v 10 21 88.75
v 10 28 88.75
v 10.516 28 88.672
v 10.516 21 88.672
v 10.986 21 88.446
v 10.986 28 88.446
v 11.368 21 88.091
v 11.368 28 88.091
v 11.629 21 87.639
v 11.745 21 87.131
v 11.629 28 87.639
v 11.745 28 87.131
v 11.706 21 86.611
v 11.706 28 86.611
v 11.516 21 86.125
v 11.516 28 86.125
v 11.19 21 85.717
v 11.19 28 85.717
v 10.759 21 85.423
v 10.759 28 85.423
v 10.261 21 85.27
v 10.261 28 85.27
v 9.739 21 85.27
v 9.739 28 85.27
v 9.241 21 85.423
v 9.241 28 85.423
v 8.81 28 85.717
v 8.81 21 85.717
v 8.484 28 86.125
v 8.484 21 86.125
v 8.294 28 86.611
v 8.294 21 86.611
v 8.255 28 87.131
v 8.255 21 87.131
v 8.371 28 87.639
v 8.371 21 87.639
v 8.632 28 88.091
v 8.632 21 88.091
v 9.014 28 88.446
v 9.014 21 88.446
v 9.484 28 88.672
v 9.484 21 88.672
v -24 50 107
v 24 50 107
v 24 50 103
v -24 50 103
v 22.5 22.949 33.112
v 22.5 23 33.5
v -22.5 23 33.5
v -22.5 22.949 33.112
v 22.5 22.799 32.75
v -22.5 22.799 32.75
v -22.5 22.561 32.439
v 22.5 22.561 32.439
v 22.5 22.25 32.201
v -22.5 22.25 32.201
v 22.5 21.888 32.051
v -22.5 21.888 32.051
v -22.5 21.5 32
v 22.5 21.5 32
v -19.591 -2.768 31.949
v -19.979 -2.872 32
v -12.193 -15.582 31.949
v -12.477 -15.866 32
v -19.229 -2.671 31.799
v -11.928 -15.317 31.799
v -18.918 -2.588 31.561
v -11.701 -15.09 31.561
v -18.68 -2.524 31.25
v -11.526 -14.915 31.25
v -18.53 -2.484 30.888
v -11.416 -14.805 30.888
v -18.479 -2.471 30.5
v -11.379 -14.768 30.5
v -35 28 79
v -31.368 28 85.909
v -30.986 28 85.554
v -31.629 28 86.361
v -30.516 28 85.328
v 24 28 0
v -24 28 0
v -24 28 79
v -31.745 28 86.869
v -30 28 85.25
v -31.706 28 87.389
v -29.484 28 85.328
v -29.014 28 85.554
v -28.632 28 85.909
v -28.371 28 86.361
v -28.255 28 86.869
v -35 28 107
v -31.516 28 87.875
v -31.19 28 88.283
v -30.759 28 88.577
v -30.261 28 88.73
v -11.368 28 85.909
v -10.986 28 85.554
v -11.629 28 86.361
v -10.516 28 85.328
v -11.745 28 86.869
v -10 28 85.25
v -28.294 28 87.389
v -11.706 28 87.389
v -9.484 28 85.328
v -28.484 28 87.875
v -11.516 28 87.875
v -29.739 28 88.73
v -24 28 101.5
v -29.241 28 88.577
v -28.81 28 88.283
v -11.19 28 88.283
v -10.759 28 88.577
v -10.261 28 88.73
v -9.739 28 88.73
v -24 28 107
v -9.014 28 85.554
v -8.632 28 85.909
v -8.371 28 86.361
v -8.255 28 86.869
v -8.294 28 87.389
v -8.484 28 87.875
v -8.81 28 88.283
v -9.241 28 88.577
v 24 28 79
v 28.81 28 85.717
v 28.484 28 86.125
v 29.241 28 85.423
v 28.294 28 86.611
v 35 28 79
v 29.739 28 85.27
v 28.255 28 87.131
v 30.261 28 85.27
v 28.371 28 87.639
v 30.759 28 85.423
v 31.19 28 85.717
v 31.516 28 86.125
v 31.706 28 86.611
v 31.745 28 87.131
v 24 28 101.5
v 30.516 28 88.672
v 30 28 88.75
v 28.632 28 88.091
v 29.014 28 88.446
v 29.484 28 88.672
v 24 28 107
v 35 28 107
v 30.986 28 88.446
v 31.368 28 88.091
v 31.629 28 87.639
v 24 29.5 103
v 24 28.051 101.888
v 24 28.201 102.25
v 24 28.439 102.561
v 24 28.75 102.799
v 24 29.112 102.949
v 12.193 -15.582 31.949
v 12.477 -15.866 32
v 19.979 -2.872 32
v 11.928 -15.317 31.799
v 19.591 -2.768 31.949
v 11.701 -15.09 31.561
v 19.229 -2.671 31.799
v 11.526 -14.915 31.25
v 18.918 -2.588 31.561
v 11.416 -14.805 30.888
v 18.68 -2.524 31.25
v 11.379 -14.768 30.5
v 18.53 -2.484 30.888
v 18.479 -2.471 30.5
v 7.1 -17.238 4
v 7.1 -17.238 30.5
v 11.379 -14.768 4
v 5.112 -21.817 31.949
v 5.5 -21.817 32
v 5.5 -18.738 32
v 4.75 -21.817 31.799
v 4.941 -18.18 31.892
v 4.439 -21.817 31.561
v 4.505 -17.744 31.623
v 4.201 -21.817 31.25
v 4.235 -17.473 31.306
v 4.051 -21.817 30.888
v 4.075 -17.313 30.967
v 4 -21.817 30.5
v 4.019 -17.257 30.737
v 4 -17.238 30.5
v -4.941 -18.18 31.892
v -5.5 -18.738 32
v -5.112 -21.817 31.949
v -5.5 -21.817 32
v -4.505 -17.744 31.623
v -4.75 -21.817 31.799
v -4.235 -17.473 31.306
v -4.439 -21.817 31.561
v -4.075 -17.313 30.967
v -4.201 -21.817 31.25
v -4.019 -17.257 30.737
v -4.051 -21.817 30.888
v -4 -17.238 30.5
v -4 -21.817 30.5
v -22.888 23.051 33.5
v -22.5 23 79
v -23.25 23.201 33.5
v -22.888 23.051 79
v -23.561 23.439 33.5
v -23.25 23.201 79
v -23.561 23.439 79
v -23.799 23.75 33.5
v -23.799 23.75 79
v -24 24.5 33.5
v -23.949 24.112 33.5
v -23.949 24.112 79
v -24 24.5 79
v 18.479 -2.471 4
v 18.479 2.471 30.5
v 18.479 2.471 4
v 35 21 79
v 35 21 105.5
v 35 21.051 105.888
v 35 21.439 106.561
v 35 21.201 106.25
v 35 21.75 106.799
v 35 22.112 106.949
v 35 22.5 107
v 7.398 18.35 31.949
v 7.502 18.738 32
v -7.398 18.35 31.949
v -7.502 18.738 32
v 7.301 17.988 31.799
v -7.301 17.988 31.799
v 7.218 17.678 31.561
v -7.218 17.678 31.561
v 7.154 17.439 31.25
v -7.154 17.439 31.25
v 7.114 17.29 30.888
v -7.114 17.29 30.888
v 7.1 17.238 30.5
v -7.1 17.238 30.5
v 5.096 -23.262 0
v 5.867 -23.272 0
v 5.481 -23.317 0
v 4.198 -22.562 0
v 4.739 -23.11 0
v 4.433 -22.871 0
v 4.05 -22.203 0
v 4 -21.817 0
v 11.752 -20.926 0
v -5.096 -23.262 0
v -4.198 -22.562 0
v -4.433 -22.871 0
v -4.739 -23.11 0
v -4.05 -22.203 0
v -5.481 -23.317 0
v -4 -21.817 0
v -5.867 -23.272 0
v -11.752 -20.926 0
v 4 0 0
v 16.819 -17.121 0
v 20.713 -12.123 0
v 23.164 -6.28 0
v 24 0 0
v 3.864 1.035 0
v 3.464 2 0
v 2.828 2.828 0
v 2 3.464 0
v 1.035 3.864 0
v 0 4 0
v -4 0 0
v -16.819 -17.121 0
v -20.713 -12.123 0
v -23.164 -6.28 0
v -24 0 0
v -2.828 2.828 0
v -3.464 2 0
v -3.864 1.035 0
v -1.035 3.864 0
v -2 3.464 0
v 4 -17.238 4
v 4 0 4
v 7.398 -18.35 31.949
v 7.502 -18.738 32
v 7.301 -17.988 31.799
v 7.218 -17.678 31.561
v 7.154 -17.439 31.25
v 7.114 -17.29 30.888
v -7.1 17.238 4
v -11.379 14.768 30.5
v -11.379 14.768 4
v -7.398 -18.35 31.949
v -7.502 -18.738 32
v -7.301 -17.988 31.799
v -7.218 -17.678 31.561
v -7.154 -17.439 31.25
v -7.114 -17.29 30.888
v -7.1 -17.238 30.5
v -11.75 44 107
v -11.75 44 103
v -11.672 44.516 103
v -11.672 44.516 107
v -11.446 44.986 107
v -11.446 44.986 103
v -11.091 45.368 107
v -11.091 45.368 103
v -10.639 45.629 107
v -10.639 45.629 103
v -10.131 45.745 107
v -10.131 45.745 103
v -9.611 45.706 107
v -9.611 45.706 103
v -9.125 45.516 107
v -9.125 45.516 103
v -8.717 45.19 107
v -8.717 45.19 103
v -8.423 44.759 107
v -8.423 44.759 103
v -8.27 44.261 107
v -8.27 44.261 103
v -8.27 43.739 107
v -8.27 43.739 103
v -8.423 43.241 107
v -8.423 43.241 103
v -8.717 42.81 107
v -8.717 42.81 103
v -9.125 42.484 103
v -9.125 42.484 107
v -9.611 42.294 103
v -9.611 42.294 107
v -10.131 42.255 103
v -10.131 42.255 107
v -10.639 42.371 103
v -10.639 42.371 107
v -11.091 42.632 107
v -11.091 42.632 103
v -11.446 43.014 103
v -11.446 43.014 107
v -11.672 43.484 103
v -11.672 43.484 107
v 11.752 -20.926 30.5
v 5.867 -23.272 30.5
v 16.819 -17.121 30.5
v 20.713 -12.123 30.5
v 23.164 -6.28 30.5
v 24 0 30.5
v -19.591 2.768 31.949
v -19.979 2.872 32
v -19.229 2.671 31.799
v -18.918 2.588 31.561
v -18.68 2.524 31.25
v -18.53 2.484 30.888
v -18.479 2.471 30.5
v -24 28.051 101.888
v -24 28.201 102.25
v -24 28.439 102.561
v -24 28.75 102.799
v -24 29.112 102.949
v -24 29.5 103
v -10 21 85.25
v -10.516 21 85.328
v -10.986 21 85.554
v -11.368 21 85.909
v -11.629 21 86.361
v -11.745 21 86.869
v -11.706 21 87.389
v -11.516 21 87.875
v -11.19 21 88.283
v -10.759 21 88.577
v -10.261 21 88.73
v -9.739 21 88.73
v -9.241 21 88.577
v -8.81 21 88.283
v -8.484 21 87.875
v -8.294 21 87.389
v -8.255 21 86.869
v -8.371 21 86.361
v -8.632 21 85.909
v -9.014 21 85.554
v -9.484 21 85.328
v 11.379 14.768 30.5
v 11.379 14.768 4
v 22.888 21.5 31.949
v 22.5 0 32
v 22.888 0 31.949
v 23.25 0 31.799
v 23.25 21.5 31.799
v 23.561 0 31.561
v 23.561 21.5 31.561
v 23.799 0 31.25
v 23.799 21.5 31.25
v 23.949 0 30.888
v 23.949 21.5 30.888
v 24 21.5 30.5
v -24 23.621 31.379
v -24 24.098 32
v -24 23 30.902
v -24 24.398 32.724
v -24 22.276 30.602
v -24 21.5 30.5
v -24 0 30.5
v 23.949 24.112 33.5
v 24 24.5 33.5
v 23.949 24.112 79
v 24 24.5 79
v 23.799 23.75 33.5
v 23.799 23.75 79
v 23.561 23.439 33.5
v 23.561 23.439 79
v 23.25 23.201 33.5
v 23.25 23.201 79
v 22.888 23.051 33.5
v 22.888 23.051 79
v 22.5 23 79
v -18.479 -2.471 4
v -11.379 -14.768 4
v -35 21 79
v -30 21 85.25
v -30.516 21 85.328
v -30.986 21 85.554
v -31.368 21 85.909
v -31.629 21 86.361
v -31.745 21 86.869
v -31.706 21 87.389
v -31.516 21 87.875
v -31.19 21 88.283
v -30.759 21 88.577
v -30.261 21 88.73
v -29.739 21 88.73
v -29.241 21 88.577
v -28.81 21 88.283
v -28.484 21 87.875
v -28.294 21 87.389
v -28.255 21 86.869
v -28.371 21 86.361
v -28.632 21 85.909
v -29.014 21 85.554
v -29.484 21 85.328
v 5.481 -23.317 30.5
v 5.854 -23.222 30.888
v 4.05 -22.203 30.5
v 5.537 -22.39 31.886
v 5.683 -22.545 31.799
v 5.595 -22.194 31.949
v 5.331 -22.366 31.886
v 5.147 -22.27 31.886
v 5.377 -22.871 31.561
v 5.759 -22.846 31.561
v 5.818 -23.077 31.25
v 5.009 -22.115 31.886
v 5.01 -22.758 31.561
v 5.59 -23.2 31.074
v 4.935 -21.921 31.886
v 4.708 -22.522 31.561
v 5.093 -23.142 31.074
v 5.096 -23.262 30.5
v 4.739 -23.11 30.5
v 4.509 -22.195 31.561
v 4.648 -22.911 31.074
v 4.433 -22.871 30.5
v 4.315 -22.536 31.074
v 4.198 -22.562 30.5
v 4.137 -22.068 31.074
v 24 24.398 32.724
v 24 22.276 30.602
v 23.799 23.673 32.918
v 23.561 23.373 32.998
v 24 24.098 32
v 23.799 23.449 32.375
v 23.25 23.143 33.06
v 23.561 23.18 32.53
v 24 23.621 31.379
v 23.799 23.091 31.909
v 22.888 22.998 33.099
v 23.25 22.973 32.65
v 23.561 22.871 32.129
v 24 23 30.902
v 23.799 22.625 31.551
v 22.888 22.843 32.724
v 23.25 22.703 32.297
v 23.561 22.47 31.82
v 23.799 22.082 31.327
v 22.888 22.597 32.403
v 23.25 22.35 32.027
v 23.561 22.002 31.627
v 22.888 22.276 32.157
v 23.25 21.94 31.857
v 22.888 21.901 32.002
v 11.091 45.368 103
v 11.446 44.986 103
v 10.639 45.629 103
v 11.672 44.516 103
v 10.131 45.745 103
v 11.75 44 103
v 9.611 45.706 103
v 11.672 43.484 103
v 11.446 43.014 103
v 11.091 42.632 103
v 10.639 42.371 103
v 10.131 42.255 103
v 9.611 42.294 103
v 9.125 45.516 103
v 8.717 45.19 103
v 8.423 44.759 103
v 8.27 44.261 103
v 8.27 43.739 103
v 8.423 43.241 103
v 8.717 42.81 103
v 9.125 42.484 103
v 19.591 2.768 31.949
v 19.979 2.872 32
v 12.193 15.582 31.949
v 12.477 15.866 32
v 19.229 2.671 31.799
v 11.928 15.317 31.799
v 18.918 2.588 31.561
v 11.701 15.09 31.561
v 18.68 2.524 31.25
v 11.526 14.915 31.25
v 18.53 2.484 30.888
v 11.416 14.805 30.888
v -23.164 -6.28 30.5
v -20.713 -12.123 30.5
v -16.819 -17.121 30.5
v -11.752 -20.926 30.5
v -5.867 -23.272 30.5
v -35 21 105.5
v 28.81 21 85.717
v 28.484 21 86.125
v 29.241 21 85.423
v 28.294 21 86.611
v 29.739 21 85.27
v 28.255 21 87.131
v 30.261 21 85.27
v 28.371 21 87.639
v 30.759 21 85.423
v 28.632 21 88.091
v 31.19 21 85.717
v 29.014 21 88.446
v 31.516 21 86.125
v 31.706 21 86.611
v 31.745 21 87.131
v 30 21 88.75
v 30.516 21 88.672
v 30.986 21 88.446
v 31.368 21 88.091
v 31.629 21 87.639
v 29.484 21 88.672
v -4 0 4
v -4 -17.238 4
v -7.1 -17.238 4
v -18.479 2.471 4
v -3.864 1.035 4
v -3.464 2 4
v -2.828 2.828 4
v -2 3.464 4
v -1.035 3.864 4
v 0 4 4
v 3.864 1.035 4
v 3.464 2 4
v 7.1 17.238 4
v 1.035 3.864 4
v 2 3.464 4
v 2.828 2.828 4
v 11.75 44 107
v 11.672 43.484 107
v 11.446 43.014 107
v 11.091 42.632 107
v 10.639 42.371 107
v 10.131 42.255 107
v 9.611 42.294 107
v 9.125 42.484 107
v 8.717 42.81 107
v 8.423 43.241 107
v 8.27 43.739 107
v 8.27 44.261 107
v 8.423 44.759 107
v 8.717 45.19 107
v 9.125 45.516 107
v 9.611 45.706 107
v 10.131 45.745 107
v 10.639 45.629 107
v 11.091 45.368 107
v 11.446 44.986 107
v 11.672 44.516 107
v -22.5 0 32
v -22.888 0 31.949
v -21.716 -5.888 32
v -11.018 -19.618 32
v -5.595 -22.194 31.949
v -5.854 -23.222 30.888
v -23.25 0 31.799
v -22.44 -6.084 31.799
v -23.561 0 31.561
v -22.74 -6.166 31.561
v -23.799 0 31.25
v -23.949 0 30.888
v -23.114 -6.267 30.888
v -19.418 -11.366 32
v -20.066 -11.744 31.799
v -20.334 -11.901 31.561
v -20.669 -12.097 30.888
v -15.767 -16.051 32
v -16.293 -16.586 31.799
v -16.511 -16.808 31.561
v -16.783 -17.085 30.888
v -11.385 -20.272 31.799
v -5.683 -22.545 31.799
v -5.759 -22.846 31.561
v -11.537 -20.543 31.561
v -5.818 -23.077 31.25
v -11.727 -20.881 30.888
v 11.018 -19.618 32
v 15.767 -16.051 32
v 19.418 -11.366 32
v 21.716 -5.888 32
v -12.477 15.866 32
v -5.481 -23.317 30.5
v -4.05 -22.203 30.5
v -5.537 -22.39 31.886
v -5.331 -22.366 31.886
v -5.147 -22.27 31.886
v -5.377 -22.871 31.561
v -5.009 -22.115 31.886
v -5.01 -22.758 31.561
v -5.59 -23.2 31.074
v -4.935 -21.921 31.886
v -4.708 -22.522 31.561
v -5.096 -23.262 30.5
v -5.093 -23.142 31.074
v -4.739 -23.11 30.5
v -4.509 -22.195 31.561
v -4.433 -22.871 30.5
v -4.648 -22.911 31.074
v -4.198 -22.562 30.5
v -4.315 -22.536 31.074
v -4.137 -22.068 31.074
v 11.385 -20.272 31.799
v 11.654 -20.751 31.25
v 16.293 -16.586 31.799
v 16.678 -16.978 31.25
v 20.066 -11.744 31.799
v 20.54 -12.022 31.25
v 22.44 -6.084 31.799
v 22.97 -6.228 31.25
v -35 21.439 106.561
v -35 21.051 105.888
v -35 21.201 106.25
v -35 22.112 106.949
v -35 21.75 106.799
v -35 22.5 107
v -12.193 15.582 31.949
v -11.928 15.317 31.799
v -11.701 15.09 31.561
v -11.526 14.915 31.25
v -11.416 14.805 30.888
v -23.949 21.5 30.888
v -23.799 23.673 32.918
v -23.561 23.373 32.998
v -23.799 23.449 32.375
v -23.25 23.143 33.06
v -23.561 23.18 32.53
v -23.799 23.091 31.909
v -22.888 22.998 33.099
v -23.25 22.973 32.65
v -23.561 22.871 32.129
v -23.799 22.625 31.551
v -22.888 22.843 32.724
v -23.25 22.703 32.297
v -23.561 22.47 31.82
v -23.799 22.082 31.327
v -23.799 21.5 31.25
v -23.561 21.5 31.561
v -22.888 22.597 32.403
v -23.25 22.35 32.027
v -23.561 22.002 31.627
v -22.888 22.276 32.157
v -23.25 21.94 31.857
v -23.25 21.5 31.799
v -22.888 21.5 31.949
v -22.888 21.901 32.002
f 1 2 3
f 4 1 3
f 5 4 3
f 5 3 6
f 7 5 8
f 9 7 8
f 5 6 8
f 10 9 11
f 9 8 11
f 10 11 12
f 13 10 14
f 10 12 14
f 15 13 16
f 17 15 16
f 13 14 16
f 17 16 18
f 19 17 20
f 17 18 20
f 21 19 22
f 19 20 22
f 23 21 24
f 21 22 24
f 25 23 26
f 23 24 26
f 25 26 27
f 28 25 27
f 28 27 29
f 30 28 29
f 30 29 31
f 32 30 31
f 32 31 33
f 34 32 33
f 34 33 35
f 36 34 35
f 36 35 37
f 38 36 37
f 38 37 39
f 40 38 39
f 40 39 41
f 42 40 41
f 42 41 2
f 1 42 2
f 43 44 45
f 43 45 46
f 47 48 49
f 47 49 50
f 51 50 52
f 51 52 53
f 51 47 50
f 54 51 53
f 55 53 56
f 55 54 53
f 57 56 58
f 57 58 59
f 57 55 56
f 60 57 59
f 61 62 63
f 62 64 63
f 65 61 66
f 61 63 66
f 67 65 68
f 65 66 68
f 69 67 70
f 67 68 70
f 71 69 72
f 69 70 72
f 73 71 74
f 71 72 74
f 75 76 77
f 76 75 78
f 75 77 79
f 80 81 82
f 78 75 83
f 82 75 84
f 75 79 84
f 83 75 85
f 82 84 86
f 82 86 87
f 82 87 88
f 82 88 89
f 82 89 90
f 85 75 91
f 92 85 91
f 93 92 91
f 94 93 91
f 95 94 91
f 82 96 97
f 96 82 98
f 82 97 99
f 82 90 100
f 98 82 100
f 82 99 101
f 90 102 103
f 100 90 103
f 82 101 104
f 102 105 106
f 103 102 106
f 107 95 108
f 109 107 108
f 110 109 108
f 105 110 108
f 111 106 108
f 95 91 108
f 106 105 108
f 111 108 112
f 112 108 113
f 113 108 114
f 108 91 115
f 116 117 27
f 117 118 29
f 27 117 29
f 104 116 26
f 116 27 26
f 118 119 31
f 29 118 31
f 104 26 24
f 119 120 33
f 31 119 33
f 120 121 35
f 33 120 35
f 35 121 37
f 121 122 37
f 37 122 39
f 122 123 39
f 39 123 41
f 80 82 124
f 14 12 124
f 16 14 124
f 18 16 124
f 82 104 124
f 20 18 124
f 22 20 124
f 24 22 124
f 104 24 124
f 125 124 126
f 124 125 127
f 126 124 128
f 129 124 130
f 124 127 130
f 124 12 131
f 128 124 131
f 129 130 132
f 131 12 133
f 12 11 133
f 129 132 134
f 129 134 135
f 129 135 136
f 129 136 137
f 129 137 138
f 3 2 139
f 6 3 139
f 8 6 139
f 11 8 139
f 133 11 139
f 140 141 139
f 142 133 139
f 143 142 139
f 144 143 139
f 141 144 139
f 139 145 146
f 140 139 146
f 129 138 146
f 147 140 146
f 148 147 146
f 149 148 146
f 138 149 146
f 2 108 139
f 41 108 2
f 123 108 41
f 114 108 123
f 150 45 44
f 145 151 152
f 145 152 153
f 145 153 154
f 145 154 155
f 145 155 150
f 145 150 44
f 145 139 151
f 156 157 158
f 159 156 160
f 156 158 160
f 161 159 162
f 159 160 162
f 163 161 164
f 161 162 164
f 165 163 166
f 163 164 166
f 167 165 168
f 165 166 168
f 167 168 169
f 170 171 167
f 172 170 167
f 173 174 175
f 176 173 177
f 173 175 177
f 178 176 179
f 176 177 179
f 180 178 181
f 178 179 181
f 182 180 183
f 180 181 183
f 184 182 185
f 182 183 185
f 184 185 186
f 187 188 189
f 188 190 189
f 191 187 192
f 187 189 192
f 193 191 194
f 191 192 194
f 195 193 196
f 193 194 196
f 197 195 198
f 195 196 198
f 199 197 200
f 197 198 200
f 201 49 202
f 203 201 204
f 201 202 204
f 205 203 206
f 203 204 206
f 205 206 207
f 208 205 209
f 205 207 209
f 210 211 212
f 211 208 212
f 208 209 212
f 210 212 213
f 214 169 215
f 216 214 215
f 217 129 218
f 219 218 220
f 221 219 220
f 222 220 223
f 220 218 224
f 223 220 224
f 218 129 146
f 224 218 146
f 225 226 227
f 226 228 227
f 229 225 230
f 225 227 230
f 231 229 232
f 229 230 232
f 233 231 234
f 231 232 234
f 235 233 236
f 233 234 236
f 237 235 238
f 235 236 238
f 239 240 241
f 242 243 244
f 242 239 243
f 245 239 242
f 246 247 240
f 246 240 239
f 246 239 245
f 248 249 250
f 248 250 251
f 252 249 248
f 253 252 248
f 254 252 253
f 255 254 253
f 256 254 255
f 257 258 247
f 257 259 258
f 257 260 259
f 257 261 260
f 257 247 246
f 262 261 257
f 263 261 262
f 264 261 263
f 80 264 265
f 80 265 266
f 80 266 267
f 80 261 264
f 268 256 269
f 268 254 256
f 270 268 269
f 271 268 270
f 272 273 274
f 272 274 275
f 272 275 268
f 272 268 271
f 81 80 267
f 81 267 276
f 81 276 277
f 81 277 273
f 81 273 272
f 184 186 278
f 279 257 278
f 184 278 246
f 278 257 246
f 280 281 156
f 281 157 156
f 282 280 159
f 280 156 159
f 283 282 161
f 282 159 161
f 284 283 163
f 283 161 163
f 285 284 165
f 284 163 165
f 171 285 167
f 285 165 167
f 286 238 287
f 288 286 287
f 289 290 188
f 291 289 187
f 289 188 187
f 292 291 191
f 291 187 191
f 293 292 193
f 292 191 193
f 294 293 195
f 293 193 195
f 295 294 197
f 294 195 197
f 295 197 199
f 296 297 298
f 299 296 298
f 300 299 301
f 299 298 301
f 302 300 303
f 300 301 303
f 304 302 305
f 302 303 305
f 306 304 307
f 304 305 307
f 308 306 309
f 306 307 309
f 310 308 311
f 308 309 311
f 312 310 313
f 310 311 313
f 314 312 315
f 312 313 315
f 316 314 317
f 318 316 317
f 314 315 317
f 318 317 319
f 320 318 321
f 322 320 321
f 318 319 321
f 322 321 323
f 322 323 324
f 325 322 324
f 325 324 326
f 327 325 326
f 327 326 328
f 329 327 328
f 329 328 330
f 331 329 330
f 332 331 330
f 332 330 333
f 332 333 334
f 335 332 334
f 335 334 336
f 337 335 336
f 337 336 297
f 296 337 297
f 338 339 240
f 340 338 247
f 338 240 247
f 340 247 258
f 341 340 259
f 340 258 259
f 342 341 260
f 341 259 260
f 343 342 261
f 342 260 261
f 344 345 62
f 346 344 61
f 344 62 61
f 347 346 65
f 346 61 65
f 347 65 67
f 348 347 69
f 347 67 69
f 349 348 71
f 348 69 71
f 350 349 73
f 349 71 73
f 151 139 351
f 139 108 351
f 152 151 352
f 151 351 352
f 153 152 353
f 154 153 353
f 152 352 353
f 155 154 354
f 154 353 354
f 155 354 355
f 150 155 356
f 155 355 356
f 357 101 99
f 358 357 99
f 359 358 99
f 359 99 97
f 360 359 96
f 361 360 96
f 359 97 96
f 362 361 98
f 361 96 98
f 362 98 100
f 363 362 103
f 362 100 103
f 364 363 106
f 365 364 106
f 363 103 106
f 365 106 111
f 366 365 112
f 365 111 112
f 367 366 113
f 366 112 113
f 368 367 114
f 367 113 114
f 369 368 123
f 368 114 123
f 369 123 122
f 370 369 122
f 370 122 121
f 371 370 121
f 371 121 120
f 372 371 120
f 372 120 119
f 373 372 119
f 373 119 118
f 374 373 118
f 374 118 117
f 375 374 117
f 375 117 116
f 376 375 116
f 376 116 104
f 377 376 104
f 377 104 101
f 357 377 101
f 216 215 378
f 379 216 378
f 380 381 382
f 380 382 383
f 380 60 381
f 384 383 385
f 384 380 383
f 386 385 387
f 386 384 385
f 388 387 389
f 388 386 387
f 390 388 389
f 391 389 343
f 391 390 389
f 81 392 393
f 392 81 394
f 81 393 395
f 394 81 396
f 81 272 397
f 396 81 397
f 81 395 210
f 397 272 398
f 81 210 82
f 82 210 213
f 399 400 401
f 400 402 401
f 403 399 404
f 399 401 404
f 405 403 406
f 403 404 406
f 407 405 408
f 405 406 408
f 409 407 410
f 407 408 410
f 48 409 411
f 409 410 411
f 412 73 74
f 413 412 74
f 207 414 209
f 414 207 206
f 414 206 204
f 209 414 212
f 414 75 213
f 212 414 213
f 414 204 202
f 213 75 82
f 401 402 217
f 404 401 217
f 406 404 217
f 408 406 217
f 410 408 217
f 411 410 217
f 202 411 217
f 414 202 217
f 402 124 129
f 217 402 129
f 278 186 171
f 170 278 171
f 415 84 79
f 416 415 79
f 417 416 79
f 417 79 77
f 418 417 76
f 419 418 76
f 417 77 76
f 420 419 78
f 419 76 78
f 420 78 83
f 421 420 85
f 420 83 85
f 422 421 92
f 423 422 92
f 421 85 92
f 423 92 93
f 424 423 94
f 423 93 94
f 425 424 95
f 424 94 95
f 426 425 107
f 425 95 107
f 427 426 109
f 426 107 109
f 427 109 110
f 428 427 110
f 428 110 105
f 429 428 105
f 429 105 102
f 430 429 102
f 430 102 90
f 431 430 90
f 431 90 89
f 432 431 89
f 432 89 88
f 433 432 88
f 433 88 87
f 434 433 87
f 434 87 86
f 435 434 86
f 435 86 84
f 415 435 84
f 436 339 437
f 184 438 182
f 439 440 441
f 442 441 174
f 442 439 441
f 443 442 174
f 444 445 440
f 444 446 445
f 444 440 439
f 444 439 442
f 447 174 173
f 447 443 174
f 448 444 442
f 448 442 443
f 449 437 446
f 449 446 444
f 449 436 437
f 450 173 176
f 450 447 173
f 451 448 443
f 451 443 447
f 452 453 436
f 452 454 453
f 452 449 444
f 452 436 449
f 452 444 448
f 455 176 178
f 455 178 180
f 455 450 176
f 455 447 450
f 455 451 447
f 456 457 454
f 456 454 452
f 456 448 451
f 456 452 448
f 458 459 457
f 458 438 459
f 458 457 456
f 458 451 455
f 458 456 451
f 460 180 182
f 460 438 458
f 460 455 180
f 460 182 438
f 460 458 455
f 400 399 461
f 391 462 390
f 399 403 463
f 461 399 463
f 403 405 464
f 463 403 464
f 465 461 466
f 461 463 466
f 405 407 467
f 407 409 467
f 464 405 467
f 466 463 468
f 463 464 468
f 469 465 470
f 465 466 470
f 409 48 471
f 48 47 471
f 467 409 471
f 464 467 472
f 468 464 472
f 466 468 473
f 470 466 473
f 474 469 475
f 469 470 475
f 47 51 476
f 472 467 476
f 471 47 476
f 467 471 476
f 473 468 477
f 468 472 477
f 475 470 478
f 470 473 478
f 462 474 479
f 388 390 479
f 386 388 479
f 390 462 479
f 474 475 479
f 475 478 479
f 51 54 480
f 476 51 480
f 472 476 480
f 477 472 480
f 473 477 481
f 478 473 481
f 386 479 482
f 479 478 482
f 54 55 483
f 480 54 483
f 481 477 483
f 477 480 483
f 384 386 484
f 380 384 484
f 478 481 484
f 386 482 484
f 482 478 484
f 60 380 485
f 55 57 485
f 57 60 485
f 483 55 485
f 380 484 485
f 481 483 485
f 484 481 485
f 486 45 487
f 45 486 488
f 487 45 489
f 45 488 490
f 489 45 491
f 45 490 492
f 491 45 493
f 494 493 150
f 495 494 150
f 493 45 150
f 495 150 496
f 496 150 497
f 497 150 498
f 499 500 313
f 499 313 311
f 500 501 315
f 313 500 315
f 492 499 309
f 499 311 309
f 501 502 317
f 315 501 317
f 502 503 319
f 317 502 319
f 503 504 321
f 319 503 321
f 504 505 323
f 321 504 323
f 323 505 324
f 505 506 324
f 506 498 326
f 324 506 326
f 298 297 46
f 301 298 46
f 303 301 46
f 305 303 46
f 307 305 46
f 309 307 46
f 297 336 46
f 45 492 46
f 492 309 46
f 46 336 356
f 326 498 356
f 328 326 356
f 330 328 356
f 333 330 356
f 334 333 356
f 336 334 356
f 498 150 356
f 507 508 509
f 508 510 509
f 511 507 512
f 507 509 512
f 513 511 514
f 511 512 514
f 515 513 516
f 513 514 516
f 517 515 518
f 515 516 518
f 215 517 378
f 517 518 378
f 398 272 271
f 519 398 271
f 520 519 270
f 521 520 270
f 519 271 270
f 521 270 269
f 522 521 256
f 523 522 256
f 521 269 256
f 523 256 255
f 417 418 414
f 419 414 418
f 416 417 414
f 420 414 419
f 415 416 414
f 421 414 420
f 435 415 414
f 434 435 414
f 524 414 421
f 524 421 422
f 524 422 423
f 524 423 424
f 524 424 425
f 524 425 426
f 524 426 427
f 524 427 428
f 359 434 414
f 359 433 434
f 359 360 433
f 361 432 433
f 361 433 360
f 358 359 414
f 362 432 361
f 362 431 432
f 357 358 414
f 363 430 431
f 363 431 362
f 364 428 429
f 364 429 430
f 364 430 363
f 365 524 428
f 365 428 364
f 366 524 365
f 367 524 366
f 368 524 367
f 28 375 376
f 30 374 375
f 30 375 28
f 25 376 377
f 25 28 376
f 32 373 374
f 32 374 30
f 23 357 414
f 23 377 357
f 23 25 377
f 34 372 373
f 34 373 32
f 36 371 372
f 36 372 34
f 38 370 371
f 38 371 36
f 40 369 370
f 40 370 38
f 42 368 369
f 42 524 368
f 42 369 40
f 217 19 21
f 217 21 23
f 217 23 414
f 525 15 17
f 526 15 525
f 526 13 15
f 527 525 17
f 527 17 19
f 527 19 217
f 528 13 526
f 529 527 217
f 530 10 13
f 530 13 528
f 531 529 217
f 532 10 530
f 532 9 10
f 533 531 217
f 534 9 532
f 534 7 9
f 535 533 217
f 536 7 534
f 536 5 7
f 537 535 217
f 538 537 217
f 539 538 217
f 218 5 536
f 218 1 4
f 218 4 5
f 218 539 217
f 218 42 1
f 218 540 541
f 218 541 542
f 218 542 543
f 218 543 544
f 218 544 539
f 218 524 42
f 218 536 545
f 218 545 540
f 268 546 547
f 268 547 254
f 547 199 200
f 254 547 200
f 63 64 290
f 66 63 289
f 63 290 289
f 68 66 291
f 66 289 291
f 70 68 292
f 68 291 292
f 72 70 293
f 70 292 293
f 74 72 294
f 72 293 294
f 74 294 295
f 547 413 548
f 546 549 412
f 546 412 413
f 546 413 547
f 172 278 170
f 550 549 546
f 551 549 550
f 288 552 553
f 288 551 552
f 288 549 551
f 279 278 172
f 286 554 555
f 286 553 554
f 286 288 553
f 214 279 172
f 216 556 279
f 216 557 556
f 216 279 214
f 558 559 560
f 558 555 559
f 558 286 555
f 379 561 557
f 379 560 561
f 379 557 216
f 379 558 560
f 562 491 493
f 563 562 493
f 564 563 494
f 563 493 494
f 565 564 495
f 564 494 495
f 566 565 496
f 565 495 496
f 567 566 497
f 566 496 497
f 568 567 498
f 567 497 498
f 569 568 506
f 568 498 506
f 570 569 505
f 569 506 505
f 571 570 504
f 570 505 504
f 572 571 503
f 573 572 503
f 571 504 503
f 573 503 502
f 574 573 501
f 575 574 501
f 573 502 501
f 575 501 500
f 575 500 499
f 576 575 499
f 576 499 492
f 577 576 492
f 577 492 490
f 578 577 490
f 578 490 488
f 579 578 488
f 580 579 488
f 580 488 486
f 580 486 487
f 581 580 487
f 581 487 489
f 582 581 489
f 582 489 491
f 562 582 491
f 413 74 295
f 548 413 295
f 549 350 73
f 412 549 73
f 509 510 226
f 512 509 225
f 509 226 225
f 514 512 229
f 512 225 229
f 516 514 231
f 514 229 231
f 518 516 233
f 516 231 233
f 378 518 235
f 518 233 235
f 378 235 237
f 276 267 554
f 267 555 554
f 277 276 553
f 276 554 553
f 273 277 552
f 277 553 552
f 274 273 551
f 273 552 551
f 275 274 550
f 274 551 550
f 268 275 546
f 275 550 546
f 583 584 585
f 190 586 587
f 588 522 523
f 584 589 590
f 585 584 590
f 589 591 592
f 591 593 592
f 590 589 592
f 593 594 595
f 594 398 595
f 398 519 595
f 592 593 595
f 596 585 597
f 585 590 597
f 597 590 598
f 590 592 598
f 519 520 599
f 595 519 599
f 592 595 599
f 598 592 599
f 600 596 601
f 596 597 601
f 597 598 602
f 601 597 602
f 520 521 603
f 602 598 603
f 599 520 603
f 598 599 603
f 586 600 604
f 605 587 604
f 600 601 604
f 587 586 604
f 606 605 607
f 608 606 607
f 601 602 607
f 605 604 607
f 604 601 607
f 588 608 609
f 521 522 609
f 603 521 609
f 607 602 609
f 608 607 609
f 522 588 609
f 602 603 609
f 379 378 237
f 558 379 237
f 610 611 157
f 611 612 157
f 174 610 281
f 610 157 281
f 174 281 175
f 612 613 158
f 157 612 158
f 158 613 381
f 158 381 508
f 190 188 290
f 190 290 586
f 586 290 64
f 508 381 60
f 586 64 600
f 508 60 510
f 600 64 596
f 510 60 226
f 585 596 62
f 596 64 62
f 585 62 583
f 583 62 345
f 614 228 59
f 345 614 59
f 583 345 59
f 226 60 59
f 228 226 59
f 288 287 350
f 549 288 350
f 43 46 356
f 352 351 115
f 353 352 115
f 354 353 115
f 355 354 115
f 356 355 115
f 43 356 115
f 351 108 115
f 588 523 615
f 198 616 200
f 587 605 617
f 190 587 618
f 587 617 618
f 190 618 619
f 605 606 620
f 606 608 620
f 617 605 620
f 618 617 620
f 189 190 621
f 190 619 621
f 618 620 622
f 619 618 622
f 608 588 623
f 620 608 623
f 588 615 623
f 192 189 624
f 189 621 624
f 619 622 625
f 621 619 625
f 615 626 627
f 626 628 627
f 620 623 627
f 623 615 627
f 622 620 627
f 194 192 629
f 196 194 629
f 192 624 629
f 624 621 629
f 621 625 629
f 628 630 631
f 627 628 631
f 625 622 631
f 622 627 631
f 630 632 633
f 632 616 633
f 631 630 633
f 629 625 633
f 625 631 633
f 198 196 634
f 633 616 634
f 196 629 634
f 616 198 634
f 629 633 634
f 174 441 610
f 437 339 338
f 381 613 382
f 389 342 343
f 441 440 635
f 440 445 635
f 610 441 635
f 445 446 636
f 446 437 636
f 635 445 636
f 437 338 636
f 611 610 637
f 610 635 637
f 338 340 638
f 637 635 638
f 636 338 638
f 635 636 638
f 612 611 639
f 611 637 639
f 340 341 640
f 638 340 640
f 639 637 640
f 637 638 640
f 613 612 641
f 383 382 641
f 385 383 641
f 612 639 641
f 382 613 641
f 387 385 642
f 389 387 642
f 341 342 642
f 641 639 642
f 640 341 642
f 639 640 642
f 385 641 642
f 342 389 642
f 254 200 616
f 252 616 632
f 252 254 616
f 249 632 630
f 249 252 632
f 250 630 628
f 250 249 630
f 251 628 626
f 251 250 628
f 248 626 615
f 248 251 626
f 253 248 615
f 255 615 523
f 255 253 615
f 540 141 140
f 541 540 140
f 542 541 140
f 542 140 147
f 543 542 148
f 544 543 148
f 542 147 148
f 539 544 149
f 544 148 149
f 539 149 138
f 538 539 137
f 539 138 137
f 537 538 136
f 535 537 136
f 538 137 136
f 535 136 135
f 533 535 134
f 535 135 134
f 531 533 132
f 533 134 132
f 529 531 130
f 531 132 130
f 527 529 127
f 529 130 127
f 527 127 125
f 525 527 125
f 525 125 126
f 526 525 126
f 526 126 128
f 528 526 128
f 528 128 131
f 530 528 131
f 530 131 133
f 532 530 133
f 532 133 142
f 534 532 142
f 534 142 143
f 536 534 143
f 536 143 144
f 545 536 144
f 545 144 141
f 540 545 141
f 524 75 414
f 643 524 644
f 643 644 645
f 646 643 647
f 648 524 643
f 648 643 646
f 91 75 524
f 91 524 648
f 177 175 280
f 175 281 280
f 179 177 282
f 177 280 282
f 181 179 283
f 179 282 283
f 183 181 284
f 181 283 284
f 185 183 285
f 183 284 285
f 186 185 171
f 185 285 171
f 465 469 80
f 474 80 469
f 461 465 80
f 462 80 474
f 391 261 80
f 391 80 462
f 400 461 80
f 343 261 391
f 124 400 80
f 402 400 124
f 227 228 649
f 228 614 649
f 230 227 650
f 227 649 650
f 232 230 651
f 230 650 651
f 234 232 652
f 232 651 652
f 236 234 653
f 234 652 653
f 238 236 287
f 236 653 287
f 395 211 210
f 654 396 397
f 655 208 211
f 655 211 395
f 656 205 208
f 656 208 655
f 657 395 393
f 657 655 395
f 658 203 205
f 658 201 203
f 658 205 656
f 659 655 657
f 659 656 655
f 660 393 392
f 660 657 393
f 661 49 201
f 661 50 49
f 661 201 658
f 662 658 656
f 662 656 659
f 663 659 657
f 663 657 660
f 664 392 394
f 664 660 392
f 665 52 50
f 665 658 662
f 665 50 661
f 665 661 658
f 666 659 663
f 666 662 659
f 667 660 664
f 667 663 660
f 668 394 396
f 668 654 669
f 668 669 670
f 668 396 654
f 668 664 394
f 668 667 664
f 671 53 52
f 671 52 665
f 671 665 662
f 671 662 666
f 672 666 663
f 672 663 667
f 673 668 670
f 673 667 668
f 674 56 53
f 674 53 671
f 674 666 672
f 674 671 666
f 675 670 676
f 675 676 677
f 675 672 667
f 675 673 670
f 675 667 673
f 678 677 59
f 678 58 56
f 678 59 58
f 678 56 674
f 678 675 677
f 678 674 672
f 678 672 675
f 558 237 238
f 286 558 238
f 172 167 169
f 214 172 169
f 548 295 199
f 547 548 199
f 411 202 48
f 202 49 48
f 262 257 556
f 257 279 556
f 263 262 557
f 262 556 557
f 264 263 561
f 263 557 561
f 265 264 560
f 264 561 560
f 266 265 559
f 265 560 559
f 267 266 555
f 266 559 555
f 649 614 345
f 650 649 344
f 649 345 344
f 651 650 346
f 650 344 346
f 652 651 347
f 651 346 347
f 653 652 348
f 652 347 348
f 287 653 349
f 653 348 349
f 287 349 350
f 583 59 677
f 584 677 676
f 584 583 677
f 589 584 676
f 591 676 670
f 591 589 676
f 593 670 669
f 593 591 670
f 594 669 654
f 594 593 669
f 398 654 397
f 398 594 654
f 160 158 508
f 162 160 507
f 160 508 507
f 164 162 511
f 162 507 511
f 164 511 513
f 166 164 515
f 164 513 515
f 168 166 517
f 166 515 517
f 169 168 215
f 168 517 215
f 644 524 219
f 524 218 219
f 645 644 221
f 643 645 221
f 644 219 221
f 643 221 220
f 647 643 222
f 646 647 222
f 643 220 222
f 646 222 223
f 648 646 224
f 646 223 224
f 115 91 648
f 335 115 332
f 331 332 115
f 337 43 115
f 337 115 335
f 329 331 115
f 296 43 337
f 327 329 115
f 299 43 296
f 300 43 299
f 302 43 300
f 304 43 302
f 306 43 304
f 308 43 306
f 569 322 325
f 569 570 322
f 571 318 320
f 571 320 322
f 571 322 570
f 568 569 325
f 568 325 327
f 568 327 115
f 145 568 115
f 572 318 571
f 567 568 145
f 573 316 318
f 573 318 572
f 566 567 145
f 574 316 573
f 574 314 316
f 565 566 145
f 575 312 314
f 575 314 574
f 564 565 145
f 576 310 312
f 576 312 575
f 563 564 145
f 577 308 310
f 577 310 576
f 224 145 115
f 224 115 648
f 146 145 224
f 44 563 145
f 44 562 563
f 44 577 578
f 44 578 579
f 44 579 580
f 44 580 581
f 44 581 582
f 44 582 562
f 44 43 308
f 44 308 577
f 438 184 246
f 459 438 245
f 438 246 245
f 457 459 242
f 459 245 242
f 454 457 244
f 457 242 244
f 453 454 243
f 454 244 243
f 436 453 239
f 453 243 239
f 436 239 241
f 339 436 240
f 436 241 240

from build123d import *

# Parameters (mm, degrees)
SKETCH1_R                = 24
BOSS_EXTRUDE2_DEPTH      = 32
CUT_EXTRUDE1_DEPTH       = 28
CUT_EXTRUDE2_REACH       = 48.648
SKETCH3_W                = 8
SKETCH3_H                = 8
BOSS_EXTRUDE3_DEPTH      = 32
SKETCH6_W                = 48
SKETCH6_H                = 5
BOSS_EXTRUDE4_DEPTH      = 75
SKETCH7_W                = 48
SKETCH7_H                = 4
BOSS_EXTRUDE5_DEPTH      = 22
CUT_EXTRUDE3_REACH       = 118.983
SKETCH8_R                = 1.75
BOSS_EXTRUDE7_DEPTH      = 2
BOSS_EXTRUDE7_DEPTH_BACK = 5
SKETCH11_W               = 70
SKETCH11_H               = 28
CUT_EXTRUDE5_REACH       = 126.008
SKETCH12_R               = 1.75
CUT_EXTRUDE6_DEPTH       = 97.695398029
FILLET2_R                = 1.5
FILLET3_R                = 4


with BuildPart() as part:
    # Sketch1 → Boss-Extrude2 (new body)
    with BuildSketch(Plane(origin=(0, 0, 0), x_dir=(0, 1, 0), z_dir=(0, 0, 1))):
        with Locations(Location((0, 0, 0), (0, 0, 270))):
            Circle(SKETCH1_R)
    extrude(amount=BOSS_EXTRUDE2_DEPTH)

    # Sketch2 → Cut-Extrude1 (cut)
    with BuildSketch(Plane.XY.offset(32)):
        Polygon((7.09995, 17.23849547), (-7.09995, 17.23849547), (-11.379, 14.767984801), (-18.47895, 2.470510669), (-18.47895, -2.470510669), (-11.379, -14.767984801), (-7.09995, -17.23849547), (7.09995, -17.23849547), (11.379, -14.767984801), (18.47895, -2.470510669), (18.47895, 2.470510669), (11.379, 14.767984801), align=None)
    extrude(amount=-CUT_EXTRUDE1_DEPTH, mode=Mode.SUBTRACT)

    # Sketch3 → Cut-Extrude2 (cut, up to next)
    with BuildSketch(Plane(origin=(0, 0, 0), x_dir=(1, 0, 0), z_dir=(0, 0, -1)), mode=Mode.PRIVATE) as cut_extrude2_sk1:
        Rectangle(SKETCH3_W, SKETCH3_H)
    cut_extrude2_tool1 = extrude(cut_extrude2_sk1.sketch, amount=-CUT_EXTRUDE2_REACH, mode=Mode.PRIVATE) & part.part
    add(cut_extrude2_tool1.solids().sort_by_distance((0, 0, 0))[0], mode=Mode.SUBTRACT)

    # Sketch4 → Boss-Extrude3 (add)
    with BuildSketch(Plane.XY.offset(32)):
        with BuildLine():
            Line((-24, 0), (-24, 28))
            Line((-24, 28), (24, 28))
            Line((24, 28), (24, 0))
            Line((24, 0), (22, 0))
            ThreePointArc((22, 0), (0, 22), (-22, 0))
            Line((-22, 0), (-24, 0))
        make_face()
    extrude(amount=-BOSS_EXTRUDE3_DEPTH)

    # Sketch6 → Boss-Extrude4 (add)
    with BuildSketch(Plane.XY.offset(32)):
        with Locations((0, 25.5)):
            Rectangle(SKETCH6_W, SKETCH6_H)
    extrude(amount=BOSS_EXTRUDE4_DEPTH)

    # Sketch7 → Boss-Extrude5 (add)
    with BuildSketch(Plane(origin=(0, 28, 0), x_dir=(-1, 0, 0), z_dir=(0, 1, 0))):
        with Locations((0, 105)):
            Rectangle(SKETCH7_W, SKETCH7_H)
    extrude(amount=BOSS_EXTRUDE5_DEPTH)

    # Sketch8 → Cut-Extrude3 (cut, up to next)
    with BuildSketch(Plane(origin=(0, 0, 103), x_dir=(1, 0, 0), z_dir=(0, 0, -1)), mode=Mode.PRIVATE) as cut_extrude3_sk1:
        with Locations(Location((-10, -44, 0), (0, 0, 180))):
            Circle(SKETCH8_R)
    cut_extrude3_tool1 = extrude(cut_extrude3_sk1.sketch, amount=-CUT_EXTRUDE3_REACH, mode=Mode.PRIVATE) & part.part
    # Sketch8 → Cut-Extrude3 (cut, up to next)
    with BuildSketch(Plane(origin=(0, 0, 103), x_dir=(1, 0, 0), z_dir=(0, 0, -1)), mode=Mode.PRIVATE) as cut_extrude3_sk2:
        with Locations((10, -44)):
            Circle(SKETCH8_R)
    cut_extrude3_tool2 = extrude(cut_extrude3_sk2.sketch, amount=-CUT_EXTRUDE3_REACH, mode=Mode.PRIVATE) & part.part
    add(cut_extrude3_tool1.solids().sort_by_distance((-10, 44, 103))[0], mode=Mode.SUBTRACT)
    add(cut_extrude3_tool2.solids().sort_by_distance((10, 44, 103))[0], mode=Mode.SUBTRACT)

    # Sketch11 → Boss-Extrude7 (add, two sides: drawn at the far end of the back side and taken through both)
    with BuildSketch(Plane.XZ.offset(-23).offset(-BOSS_EXTRUDE7_DEPTH_BACK)):
        with Locations((0, 93)):
            Rectangle(SKETCH11_W, SKETCH11_H)
    extrude(amount=BOSS_EXTRUDE7_DEPTH + BOSS_EXTRUDE7_DEPTH_BACK)

    # Sketch12 → Cut-Extrude5 (cut, up to next)
    with BuildSketch(Plane(origin=(0, 28, 0), x_dir=(-1, 0, 0), z_dir=(0, 1, 0)), mode=Mode.PRIVATE) as cut_extrude5_sk1:
        with Locations(Location((-10, 87, 0), (0, 0, 90))):
            Circle(SKETCH12_R)
    cut_extrude5_tool1 = extrude(cut_extrude5_sk1.sketch, amount=-CUT_EXTRUDE5_REACH, mode=Mode.PRIVATE) & part.part
    # Sketch12 → Cut-Extrude5 (cut, up to next)
    with BuildSketch(Plane(origin=(0, 28, 0), x_dir=(-1, 0, 0), z_dir=(0, 1, 0)), mode=Mode.PRIVATE) as cut_extrude5_sk2:
        with Locations(Location((-30, 87, 0), (0, 0, 90))):
            Circle(SKETCH12_R)
    cut_extrude5_tool2 = extrude(cut_extrude5_sk2.sketch, amount=-CUT_EXTRUDE5_REACH, mode=Mode.PRIVATE) & part.part
    # Sketch12 → Cut-Extrude5 (cut, up to next)
    with BuildSketch(Plane(origin=(0, 28, 0), x_dir=(-1, 0, 0), z_dir=(0, 1, 0)), mode=Mode.PRIVATE) as cut_extrude5_sk3:
        with Locations(Location((10, 87, 0), (0, 0, 270))):
            Circle(SKETCH12_R)
    cut_extrude5_tool3 = extrude(cut_extrude5_sk3.sketch, amount=-CUT_EXTRUDE5_REACH, mode=Mode.PRIVATE) & part.part
    # Sketch12 → Cut-Extrude5 (cut, up to next)
    with BuildSketch(Plane(origin=(0, 28, 0), x_dir=(-1, 0, 0), z_dir=(0, 1, 0)), mode=Mode.PRIVATE) as cut_extrude5_sk4:
        with Locations(Location((30, 87, 0), (0, 0, 270))):
            Circle(SKETCH12_R)
    cut_extrude5_tool4 = extrude(cut_extrude5_sk4.sketch, amount=-CUT_EXTRUDE5_REACH, mode=Mode.PRIVATE) & part.part
    add(cut_extrude5_tool1.solids().sort_by_distance((10, 28, 87))[0], mode=Mode.SUBTRACT)
    add(cut_extrude5_tool2.solids().sort_by_distance((30, 28, 87))[0], mode=Mode.SUBTRACT)
    add(cut_extrude5_tool3.solids().sort_by_distance((-10, 28, 87))[0], mode=Mode.SUBTRACT)
    add(cut_extrude5_tool4.solids().sort_by_distance((-30, 28, 87))[0], mode=Mode.SUBTRACT)

    # Sketch13 → Cut-Extrude6 (cut, through all)
    with BuildSketch(Plane.XY.offset(32)):
        with BuildLine():
            Line((-4, -4), (-4, -23.664319132))
            ThreePointArc((-4, -23.664319132), (0, -24), (4, -23.664319132))
            Line((4, -23.664319132), (4, -4))
            Line((4, -4), (-4, -4))
        make_face()
    extrude(amount=-CUT_EXTRUDE6_DEPTH, mode=Mode.SUBTRACT)

    # Fillet2
    fillet2_edges = [part.edges().sort_by_distance(p)[0] for p in [
        (24, 23, 55.5),
        (-24, 23, 55.5),
        (0, 21, 107),
        (-9.239475, 16.003240135, 32),
        (-14.928975, 8.619247735, 32),
        (5.549975, -17.23849547, 32),
        (-18.47895, 0, 32),
        (18.33030278, -15.491933385, 32),
        (-14.928975, -8.619247735, 32),
        (-4, -20.451407301, 32),
        (4, -20.451407301, 32),
        (-9.239475, -16.003240135, 32),
        (4, -23.664319132, 16),
        (-4, -23.664319132, 16),
        (-5.549975, -17.23849547, 32),
        (9.239475, -16.003240135, 32),
        (14.928975, -8.619247735, 32),
        (18.47895, 0, 32),
        (14.928975, 8.619247735, 32),
        (9.239475, 16.003240135, 32),
        (0, 17.23849547, 32),
        (-18.33030278, -15.491933385, 32),
        (24, 11.5, 32),
        (-24, 11.5, 32),
        (0, 23, 32),
        (0, 28, 103),
    ]]
    fillet(fillet2_edges, radius=FILLET2_R)

    # Fillet3
    fillet3_edges = [part.edges().sort_by_distance(p)[0] for p in [
        (-4, 4, 2),
        (4, 4, 2),
    ]]
    fillet(fillet3_edges, radius=FILLET3_R - 0.0001)  # a hair under: the kernel refuses the full size


solid = part.part
